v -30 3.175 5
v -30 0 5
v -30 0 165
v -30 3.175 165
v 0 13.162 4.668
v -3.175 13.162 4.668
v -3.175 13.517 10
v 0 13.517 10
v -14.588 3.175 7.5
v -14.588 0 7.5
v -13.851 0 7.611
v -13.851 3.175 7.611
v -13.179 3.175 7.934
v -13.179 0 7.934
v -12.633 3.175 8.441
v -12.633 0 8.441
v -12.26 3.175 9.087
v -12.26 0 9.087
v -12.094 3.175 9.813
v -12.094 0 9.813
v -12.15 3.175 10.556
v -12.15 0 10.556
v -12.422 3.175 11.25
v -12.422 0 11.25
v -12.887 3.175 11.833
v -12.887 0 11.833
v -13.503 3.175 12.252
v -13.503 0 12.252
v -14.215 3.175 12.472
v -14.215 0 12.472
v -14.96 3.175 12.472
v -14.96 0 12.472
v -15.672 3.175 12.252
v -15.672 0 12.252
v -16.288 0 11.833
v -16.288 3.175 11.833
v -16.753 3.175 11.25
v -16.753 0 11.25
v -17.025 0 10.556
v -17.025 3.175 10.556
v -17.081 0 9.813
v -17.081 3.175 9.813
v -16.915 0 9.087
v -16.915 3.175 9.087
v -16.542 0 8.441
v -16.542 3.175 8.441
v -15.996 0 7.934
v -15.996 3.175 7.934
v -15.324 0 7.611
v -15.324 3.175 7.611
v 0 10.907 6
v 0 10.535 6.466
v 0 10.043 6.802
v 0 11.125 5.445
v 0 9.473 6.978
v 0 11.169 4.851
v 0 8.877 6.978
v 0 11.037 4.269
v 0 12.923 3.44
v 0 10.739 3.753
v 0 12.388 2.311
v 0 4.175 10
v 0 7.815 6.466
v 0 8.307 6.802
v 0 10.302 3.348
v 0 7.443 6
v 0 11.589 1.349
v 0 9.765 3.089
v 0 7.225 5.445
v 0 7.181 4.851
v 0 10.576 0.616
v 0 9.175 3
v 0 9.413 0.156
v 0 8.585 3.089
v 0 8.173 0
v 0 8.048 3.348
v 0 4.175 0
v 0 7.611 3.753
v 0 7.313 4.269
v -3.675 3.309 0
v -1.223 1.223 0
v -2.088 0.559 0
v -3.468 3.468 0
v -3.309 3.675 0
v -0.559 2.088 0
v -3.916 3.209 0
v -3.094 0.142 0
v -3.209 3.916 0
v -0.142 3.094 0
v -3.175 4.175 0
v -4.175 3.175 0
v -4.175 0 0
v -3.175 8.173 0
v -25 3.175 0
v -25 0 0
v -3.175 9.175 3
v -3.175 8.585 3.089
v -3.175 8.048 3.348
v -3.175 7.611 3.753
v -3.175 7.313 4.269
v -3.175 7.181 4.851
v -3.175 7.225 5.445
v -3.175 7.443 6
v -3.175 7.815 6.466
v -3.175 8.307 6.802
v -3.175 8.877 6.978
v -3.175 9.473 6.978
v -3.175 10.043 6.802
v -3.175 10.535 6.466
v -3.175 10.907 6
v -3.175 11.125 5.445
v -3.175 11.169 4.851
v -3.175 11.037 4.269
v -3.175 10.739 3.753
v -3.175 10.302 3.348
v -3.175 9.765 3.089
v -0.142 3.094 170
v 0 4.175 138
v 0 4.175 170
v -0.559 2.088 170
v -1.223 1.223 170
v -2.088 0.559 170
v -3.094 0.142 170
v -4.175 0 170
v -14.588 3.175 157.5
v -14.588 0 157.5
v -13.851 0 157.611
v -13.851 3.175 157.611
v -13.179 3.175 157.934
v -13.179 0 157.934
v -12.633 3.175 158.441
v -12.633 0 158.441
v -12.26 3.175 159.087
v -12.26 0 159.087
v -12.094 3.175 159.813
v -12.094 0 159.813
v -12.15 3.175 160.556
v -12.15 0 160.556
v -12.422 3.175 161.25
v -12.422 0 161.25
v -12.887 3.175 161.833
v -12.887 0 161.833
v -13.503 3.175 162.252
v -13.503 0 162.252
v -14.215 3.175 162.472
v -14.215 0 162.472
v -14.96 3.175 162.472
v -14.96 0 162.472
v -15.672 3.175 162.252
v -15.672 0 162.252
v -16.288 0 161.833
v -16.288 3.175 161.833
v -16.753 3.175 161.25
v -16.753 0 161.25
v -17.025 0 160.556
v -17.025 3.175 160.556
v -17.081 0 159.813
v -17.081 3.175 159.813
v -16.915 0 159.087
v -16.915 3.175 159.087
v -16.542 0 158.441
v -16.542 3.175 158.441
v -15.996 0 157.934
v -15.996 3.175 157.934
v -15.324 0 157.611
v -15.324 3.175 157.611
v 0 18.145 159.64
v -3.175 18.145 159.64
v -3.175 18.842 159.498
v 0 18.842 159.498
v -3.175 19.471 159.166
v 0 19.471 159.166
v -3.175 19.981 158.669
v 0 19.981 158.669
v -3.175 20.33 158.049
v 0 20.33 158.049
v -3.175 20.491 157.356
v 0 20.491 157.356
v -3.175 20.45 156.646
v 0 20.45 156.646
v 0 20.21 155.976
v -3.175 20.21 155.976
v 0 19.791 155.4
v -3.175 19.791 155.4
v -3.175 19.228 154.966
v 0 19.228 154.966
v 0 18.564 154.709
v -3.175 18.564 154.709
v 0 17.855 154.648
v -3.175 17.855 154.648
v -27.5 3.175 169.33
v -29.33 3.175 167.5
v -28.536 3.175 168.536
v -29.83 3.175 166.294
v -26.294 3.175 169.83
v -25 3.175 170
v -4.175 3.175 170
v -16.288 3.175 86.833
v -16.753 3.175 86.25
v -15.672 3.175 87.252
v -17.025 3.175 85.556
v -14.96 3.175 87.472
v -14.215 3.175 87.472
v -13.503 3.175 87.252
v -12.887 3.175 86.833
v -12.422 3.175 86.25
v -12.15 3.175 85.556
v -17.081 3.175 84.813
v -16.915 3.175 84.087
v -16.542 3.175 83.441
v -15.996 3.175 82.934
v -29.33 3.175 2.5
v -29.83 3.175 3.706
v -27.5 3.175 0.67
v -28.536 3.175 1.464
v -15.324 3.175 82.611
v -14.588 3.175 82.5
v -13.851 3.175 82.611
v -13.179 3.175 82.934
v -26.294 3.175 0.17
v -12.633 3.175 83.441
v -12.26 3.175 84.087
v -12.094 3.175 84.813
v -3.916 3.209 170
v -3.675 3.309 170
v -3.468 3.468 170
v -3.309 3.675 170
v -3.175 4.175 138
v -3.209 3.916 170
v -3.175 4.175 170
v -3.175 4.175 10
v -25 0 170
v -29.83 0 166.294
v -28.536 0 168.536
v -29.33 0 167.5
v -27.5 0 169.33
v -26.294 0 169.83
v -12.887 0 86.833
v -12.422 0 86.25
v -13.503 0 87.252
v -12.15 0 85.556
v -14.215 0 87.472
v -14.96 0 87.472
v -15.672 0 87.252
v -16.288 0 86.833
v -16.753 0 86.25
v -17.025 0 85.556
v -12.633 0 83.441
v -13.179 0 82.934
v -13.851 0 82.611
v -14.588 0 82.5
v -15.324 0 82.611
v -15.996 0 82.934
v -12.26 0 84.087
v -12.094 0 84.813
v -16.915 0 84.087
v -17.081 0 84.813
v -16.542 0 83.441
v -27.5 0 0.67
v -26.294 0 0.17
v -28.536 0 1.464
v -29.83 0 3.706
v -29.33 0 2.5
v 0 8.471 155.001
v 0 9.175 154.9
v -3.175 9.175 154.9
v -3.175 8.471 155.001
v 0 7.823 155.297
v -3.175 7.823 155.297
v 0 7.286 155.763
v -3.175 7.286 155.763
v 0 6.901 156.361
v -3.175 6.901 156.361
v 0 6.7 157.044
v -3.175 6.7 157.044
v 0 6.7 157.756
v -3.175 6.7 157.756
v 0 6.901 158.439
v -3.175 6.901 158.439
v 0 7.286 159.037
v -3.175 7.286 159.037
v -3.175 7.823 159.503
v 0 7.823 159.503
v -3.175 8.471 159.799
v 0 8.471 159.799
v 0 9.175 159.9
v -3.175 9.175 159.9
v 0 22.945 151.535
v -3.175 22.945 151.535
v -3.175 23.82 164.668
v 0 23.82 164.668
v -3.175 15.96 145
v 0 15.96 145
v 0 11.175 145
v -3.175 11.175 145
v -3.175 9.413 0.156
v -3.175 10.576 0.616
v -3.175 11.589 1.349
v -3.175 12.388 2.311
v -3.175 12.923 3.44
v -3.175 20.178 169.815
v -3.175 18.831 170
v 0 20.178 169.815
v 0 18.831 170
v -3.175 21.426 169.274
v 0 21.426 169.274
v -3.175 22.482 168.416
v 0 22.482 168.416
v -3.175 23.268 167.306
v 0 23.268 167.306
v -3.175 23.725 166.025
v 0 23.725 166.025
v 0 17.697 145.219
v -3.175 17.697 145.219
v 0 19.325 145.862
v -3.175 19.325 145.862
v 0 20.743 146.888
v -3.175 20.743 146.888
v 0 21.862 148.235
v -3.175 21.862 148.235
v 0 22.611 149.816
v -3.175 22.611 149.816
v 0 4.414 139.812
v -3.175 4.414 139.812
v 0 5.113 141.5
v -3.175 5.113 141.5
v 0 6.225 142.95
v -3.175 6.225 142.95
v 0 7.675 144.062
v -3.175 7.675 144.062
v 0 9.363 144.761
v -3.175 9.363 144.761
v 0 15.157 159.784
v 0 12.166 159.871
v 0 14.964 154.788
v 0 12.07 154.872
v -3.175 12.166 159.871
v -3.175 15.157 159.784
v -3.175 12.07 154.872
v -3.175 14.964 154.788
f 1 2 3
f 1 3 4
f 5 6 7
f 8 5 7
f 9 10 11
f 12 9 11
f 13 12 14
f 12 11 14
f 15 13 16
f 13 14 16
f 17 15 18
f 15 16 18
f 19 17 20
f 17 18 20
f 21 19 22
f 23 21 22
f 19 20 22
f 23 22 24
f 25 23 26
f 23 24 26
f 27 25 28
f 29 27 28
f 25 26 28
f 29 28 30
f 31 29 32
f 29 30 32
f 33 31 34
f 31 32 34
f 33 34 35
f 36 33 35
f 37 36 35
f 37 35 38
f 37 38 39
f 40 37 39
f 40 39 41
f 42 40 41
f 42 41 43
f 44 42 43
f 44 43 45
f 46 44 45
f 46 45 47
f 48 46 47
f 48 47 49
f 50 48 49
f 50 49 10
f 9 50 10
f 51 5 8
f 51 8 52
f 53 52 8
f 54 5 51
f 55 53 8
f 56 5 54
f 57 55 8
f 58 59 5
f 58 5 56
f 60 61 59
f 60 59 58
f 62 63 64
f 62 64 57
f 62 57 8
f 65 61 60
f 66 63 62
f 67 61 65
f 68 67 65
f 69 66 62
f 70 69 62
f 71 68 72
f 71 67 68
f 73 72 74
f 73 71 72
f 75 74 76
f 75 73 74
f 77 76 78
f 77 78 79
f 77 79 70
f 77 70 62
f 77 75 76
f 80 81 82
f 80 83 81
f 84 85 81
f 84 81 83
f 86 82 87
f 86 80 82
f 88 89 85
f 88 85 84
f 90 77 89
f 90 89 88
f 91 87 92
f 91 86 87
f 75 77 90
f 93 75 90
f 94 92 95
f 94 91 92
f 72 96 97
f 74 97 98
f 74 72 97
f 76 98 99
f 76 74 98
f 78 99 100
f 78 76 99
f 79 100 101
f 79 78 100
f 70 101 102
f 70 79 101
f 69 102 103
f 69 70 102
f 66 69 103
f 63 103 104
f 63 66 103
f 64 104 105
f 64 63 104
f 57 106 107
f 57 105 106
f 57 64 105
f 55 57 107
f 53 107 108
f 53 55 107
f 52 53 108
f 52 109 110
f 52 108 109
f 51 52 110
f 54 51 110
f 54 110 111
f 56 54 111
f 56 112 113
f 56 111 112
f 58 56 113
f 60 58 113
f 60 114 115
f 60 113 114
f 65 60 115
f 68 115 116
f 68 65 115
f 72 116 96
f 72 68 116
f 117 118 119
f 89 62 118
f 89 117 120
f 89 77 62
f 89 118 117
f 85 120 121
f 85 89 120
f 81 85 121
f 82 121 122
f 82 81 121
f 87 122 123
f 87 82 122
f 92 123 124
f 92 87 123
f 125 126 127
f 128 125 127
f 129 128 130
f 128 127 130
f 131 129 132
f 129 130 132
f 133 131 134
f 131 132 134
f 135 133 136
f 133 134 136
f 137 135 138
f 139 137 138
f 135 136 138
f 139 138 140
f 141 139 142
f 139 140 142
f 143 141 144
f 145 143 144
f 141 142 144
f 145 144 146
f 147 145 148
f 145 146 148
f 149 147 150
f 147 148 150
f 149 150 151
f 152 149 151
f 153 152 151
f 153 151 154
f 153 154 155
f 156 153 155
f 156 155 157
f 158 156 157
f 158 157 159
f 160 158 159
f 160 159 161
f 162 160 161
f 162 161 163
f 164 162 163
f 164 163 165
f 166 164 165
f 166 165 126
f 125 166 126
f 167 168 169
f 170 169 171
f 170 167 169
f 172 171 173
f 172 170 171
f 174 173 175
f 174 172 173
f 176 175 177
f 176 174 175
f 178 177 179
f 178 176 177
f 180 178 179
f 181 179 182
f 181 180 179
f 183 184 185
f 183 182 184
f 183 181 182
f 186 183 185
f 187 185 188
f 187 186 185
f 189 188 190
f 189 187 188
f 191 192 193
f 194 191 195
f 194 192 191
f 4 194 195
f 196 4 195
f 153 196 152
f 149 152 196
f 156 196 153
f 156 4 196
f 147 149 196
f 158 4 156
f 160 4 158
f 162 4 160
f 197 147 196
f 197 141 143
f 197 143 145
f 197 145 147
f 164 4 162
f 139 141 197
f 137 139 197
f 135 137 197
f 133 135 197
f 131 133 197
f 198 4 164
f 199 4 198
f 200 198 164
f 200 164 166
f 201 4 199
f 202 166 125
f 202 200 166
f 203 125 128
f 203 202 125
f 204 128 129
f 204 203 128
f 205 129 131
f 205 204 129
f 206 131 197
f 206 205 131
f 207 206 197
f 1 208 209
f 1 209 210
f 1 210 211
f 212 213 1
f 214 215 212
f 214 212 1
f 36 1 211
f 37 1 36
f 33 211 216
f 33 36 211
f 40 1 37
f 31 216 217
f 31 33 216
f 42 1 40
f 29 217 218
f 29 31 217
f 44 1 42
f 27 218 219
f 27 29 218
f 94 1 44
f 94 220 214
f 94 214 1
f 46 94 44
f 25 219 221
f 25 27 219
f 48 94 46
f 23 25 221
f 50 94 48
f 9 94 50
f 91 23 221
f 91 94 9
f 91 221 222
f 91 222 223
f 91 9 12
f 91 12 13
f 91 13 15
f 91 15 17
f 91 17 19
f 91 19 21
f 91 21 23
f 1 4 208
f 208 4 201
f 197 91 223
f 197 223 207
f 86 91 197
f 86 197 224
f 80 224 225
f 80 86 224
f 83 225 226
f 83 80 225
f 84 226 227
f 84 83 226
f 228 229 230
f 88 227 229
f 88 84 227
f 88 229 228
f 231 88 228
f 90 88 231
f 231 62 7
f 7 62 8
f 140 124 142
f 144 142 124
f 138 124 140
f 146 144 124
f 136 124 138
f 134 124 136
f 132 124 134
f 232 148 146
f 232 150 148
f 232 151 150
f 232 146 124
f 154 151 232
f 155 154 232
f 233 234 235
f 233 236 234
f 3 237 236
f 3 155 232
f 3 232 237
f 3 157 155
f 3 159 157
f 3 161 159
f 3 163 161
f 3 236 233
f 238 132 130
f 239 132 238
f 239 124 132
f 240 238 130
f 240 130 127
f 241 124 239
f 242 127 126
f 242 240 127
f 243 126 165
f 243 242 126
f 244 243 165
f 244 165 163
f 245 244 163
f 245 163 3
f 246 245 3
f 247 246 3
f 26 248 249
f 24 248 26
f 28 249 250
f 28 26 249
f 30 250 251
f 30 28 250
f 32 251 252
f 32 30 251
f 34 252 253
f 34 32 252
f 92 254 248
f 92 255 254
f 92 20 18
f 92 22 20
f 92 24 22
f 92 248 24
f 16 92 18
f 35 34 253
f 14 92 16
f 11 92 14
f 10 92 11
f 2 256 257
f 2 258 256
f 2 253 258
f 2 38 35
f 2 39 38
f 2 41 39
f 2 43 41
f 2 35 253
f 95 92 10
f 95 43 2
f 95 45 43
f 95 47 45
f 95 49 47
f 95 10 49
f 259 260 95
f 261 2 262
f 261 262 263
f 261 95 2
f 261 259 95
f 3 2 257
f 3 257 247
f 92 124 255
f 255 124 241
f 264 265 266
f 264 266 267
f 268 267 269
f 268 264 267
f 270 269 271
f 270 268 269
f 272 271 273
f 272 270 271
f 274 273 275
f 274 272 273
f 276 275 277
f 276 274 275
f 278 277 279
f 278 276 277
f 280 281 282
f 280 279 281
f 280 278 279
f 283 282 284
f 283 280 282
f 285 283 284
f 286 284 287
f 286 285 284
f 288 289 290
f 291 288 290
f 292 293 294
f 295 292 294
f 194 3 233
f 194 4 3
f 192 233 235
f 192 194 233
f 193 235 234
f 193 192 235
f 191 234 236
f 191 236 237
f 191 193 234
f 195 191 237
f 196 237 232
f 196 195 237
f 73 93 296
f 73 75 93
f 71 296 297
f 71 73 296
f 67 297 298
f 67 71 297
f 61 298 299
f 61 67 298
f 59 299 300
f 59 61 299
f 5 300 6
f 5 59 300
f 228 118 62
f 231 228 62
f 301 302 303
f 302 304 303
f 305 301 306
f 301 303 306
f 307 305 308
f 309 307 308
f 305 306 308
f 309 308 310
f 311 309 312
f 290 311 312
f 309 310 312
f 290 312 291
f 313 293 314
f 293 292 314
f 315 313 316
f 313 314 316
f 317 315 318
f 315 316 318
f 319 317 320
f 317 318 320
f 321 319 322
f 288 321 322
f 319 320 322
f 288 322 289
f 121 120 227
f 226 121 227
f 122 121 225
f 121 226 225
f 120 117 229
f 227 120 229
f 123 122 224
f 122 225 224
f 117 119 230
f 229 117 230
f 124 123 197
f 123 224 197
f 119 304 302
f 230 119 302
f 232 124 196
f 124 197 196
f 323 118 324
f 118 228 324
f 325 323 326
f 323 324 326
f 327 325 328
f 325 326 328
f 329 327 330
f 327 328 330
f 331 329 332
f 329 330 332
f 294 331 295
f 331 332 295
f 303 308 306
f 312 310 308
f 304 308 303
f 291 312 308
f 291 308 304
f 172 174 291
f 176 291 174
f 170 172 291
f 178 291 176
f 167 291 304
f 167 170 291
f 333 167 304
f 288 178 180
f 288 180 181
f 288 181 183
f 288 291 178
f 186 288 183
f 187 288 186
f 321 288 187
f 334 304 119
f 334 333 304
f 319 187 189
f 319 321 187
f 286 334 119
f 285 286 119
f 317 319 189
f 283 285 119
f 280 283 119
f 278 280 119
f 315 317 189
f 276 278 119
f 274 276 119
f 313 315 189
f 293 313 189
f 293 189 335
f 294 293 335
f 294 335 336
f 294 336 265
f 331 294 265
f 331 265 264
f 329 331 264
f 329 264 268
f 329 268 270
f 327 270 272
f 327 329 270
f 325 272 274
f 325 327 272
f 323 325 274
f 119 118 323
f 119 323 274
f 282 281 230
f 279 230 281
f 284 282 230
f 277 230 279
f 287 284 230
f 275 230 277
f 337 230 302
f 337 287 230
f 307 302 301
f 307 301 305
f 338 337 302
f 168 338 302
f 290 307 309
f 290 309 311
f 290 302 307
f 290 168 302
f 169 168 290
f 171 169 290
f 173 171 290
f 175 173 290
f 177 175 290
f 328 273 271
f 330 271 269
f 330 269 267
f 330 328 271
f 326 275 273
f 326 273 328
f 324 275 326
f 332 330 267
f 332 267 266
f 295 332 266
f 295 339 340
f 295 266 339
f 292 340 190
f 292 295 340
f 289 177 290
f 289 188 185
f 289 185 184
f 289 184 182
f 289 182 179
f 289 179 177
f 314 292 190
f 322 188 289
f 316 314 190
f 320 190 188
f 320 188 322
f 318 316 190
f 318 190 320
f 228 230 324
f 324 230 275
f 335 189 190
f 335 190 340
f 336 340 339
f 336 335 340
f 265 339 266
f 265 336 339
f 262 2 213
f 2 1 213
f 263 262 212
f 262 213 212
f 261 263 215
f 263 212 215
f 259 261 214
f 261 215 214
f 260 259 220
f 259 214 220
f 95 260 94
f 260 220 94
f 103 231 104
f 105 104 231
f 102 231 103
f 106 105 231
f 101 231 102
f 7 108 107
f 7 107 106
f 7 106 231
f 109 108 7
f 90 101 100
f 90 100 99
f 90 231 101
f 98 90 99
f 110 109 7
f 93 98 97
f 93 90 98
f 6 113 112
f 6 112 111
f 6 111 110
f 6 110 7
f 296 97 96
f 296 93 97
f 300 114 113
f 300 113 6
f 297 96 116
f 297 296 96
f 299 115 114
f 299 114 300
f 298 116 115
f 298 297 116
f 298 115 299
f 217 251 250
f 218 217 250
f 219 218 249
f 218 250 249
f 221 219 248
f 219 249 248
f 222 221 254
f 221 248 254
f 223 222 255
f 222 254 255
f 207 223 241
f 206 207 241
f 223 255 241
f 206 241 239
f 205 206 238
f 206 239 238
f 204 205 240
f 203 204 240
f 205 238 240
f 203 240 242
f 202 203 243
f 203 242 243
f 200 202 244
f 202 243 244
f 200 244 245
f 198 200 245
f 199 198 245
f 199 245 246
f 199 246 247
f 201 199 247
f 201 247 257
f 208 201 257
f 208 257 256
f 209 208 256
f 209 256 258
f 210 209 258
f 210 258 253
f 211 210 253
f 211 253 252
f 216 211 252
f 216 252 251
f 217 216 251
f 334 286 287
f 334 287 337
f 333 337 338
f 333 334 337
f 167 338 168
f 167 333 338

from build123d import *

# Parameters (mm, degrees)
BASE_FLANGE1_DEPTH = 170
FILLET1_R          = 5
SKETCH6_R          = 2
CUT_EXTRUDE1_DEPTH = 178.200451467
SKETCH7_R          = 2.5
CUT_EXTRUDE2_DEPTH = 178.200451467
CUT_EXTRUDE3_DEPTH = 177.690635363
FILLET2_R          = 5
CUT_EXTRUDE4_DEPTH = 175.263907966
FILLET3_R          = 7


# Sheet-metal steps are written as plain solids
with BuildPart() as part:
    # Sketch1 → Base-Flange1 (new body)
    with BuildSketch(Plane.XY):
        with BuildLine():
            Line((0, 40), (0, 4.175))
            ThreePointArc((0, 4.175), (-1.222829189, 1.222829189), (-4.175, 0))
            Line((-4.175, 0), (-30, 0))
            Line((-30, 0), (-30, 3.175))
            Line((-30, 3.175), (-4.175, 3.175))
            ThreePointArc((-4.175, 3.175), (-3.467893219, 3.467893219), (-3.175, 4.175))
            Line((-3.175, 4.175), (-3.175, 40))
            Line((-3.175, 40), (0, 40))
        make_face()
    extrude(amount=BASE_FLANGE1_DEPTH)

    # Fillet1
    fillet1_edges = [part.edges().sort_by_distance(p)[0] for p in [
        (-1.5875, 40, 170),
        (-1.5875, 40, 0),
        (-30, 1.5875, 170),
        (-30, 1.5875, 0),
    ]]
    fillet(fillet1_edges, radius=FILLET1_R)

    # Sketch6 → Cut-Extrude1 (cut, through all)
    with BuildSketch(Plane.ZY):
        with BuildLine():
            ThreePointArc((159.640076561, 18.14476706), (156.999504521, 20.49580498), (154.648466601, 17.85523294))
            ThreePointArc((154.648466601, 17.85523294), (154.837103455, 13.516938304), (154.9, 9.175))
            ThreePointArc((154.9, 9.175), (157.4, 6.675), (159.9, 9.175))
            ThreePointArc((159.9, 9.175), (159.835005505, 13.661766133), (159.640076561, 18.14476706))
        make_face()
        with Locations(Location((5, 9.175, 0), (0, 0, 180))):
            Circle(SKETCH6_R)
    extrude(amount=CUT_EXTRUDE1_DEPTH, mode=Mode.SUBTRACT)

    # Sketch7 → Cut-Extrude2 (cut, through all)
    with BuildSketch(Plane.XZ):
        with Locations(Location((-14.5875, 160, 0), (0, 0, 270))):
            Circle(SKETCH7_R)
        with Locations(Location((-14.5875, 85, 0), (0, 0, 270))):
            Circle(SKETCH7_R)
        with Locations(Location((-14.5875, 10, 0), (0, 0, 270))):
            Circle(SKETCH7_R)
    extrude(amount=-CUT_EXTRUDE2_DEPTH, mode=Mode.SUBTRACT)

    # Sketch8 → Cut-Extrude3 (cut, through all)
    with BuildSketch(Plane.ZY.offset(3.175)):
        with BuildLine():
            Line((0, 12.85080004), (170, 24.175))
            Line((170, 24.175), (170, 35))
            ThreePointArc((170, 35), (168.535533906, 38.535533906), (165, 40))
            Line((165, 40), (5, 40))
            ThreePointArc((5, 40), (1.464466094, 38.535533906), (0, 35))
            Line((0, 35), (0, 12.85080004))
        make_face()
    extrude(amount=-CUT_EXTRUDE3_DEPTH, mode=Mode.SUBTRACT)

    # Fillet2
    fillet2_edges = [part.edges().sort_by_distance(p)[0] for p in [
        (-1.5875, 24.175, 170),
        (-1.5875, 12.85080004, 0),
    ]]
    fillet(fillet2_edges, radius=FILLET2_R)

    # Sketch9 → Cut-Extrude4 (cut, through all)
    with BuildSketch(Plane(origin=(0, 0, 0), x_dir=(0, 0, -1), z_dir=(1, 0, 0))):
        Polygon((-10, 13.51692945), (-145, 22.509676476), (-145, 4.175), (-10, 4.175), align=None)
    extrude(amount=-CUT_EXTRUDE4_DEPTH, mode=Mode.SUBTRACT)

    # Fillet3
    fillet3_edges = [part.edges().sort_by_distance(p)[0] for p in [
        (-1.5875, 4.175, 145),
        (-1.5875, 22.509676476, 145),
    ]]
    fillet(fillet3_edges, radius=FILLET3_R)


solid = part.part
